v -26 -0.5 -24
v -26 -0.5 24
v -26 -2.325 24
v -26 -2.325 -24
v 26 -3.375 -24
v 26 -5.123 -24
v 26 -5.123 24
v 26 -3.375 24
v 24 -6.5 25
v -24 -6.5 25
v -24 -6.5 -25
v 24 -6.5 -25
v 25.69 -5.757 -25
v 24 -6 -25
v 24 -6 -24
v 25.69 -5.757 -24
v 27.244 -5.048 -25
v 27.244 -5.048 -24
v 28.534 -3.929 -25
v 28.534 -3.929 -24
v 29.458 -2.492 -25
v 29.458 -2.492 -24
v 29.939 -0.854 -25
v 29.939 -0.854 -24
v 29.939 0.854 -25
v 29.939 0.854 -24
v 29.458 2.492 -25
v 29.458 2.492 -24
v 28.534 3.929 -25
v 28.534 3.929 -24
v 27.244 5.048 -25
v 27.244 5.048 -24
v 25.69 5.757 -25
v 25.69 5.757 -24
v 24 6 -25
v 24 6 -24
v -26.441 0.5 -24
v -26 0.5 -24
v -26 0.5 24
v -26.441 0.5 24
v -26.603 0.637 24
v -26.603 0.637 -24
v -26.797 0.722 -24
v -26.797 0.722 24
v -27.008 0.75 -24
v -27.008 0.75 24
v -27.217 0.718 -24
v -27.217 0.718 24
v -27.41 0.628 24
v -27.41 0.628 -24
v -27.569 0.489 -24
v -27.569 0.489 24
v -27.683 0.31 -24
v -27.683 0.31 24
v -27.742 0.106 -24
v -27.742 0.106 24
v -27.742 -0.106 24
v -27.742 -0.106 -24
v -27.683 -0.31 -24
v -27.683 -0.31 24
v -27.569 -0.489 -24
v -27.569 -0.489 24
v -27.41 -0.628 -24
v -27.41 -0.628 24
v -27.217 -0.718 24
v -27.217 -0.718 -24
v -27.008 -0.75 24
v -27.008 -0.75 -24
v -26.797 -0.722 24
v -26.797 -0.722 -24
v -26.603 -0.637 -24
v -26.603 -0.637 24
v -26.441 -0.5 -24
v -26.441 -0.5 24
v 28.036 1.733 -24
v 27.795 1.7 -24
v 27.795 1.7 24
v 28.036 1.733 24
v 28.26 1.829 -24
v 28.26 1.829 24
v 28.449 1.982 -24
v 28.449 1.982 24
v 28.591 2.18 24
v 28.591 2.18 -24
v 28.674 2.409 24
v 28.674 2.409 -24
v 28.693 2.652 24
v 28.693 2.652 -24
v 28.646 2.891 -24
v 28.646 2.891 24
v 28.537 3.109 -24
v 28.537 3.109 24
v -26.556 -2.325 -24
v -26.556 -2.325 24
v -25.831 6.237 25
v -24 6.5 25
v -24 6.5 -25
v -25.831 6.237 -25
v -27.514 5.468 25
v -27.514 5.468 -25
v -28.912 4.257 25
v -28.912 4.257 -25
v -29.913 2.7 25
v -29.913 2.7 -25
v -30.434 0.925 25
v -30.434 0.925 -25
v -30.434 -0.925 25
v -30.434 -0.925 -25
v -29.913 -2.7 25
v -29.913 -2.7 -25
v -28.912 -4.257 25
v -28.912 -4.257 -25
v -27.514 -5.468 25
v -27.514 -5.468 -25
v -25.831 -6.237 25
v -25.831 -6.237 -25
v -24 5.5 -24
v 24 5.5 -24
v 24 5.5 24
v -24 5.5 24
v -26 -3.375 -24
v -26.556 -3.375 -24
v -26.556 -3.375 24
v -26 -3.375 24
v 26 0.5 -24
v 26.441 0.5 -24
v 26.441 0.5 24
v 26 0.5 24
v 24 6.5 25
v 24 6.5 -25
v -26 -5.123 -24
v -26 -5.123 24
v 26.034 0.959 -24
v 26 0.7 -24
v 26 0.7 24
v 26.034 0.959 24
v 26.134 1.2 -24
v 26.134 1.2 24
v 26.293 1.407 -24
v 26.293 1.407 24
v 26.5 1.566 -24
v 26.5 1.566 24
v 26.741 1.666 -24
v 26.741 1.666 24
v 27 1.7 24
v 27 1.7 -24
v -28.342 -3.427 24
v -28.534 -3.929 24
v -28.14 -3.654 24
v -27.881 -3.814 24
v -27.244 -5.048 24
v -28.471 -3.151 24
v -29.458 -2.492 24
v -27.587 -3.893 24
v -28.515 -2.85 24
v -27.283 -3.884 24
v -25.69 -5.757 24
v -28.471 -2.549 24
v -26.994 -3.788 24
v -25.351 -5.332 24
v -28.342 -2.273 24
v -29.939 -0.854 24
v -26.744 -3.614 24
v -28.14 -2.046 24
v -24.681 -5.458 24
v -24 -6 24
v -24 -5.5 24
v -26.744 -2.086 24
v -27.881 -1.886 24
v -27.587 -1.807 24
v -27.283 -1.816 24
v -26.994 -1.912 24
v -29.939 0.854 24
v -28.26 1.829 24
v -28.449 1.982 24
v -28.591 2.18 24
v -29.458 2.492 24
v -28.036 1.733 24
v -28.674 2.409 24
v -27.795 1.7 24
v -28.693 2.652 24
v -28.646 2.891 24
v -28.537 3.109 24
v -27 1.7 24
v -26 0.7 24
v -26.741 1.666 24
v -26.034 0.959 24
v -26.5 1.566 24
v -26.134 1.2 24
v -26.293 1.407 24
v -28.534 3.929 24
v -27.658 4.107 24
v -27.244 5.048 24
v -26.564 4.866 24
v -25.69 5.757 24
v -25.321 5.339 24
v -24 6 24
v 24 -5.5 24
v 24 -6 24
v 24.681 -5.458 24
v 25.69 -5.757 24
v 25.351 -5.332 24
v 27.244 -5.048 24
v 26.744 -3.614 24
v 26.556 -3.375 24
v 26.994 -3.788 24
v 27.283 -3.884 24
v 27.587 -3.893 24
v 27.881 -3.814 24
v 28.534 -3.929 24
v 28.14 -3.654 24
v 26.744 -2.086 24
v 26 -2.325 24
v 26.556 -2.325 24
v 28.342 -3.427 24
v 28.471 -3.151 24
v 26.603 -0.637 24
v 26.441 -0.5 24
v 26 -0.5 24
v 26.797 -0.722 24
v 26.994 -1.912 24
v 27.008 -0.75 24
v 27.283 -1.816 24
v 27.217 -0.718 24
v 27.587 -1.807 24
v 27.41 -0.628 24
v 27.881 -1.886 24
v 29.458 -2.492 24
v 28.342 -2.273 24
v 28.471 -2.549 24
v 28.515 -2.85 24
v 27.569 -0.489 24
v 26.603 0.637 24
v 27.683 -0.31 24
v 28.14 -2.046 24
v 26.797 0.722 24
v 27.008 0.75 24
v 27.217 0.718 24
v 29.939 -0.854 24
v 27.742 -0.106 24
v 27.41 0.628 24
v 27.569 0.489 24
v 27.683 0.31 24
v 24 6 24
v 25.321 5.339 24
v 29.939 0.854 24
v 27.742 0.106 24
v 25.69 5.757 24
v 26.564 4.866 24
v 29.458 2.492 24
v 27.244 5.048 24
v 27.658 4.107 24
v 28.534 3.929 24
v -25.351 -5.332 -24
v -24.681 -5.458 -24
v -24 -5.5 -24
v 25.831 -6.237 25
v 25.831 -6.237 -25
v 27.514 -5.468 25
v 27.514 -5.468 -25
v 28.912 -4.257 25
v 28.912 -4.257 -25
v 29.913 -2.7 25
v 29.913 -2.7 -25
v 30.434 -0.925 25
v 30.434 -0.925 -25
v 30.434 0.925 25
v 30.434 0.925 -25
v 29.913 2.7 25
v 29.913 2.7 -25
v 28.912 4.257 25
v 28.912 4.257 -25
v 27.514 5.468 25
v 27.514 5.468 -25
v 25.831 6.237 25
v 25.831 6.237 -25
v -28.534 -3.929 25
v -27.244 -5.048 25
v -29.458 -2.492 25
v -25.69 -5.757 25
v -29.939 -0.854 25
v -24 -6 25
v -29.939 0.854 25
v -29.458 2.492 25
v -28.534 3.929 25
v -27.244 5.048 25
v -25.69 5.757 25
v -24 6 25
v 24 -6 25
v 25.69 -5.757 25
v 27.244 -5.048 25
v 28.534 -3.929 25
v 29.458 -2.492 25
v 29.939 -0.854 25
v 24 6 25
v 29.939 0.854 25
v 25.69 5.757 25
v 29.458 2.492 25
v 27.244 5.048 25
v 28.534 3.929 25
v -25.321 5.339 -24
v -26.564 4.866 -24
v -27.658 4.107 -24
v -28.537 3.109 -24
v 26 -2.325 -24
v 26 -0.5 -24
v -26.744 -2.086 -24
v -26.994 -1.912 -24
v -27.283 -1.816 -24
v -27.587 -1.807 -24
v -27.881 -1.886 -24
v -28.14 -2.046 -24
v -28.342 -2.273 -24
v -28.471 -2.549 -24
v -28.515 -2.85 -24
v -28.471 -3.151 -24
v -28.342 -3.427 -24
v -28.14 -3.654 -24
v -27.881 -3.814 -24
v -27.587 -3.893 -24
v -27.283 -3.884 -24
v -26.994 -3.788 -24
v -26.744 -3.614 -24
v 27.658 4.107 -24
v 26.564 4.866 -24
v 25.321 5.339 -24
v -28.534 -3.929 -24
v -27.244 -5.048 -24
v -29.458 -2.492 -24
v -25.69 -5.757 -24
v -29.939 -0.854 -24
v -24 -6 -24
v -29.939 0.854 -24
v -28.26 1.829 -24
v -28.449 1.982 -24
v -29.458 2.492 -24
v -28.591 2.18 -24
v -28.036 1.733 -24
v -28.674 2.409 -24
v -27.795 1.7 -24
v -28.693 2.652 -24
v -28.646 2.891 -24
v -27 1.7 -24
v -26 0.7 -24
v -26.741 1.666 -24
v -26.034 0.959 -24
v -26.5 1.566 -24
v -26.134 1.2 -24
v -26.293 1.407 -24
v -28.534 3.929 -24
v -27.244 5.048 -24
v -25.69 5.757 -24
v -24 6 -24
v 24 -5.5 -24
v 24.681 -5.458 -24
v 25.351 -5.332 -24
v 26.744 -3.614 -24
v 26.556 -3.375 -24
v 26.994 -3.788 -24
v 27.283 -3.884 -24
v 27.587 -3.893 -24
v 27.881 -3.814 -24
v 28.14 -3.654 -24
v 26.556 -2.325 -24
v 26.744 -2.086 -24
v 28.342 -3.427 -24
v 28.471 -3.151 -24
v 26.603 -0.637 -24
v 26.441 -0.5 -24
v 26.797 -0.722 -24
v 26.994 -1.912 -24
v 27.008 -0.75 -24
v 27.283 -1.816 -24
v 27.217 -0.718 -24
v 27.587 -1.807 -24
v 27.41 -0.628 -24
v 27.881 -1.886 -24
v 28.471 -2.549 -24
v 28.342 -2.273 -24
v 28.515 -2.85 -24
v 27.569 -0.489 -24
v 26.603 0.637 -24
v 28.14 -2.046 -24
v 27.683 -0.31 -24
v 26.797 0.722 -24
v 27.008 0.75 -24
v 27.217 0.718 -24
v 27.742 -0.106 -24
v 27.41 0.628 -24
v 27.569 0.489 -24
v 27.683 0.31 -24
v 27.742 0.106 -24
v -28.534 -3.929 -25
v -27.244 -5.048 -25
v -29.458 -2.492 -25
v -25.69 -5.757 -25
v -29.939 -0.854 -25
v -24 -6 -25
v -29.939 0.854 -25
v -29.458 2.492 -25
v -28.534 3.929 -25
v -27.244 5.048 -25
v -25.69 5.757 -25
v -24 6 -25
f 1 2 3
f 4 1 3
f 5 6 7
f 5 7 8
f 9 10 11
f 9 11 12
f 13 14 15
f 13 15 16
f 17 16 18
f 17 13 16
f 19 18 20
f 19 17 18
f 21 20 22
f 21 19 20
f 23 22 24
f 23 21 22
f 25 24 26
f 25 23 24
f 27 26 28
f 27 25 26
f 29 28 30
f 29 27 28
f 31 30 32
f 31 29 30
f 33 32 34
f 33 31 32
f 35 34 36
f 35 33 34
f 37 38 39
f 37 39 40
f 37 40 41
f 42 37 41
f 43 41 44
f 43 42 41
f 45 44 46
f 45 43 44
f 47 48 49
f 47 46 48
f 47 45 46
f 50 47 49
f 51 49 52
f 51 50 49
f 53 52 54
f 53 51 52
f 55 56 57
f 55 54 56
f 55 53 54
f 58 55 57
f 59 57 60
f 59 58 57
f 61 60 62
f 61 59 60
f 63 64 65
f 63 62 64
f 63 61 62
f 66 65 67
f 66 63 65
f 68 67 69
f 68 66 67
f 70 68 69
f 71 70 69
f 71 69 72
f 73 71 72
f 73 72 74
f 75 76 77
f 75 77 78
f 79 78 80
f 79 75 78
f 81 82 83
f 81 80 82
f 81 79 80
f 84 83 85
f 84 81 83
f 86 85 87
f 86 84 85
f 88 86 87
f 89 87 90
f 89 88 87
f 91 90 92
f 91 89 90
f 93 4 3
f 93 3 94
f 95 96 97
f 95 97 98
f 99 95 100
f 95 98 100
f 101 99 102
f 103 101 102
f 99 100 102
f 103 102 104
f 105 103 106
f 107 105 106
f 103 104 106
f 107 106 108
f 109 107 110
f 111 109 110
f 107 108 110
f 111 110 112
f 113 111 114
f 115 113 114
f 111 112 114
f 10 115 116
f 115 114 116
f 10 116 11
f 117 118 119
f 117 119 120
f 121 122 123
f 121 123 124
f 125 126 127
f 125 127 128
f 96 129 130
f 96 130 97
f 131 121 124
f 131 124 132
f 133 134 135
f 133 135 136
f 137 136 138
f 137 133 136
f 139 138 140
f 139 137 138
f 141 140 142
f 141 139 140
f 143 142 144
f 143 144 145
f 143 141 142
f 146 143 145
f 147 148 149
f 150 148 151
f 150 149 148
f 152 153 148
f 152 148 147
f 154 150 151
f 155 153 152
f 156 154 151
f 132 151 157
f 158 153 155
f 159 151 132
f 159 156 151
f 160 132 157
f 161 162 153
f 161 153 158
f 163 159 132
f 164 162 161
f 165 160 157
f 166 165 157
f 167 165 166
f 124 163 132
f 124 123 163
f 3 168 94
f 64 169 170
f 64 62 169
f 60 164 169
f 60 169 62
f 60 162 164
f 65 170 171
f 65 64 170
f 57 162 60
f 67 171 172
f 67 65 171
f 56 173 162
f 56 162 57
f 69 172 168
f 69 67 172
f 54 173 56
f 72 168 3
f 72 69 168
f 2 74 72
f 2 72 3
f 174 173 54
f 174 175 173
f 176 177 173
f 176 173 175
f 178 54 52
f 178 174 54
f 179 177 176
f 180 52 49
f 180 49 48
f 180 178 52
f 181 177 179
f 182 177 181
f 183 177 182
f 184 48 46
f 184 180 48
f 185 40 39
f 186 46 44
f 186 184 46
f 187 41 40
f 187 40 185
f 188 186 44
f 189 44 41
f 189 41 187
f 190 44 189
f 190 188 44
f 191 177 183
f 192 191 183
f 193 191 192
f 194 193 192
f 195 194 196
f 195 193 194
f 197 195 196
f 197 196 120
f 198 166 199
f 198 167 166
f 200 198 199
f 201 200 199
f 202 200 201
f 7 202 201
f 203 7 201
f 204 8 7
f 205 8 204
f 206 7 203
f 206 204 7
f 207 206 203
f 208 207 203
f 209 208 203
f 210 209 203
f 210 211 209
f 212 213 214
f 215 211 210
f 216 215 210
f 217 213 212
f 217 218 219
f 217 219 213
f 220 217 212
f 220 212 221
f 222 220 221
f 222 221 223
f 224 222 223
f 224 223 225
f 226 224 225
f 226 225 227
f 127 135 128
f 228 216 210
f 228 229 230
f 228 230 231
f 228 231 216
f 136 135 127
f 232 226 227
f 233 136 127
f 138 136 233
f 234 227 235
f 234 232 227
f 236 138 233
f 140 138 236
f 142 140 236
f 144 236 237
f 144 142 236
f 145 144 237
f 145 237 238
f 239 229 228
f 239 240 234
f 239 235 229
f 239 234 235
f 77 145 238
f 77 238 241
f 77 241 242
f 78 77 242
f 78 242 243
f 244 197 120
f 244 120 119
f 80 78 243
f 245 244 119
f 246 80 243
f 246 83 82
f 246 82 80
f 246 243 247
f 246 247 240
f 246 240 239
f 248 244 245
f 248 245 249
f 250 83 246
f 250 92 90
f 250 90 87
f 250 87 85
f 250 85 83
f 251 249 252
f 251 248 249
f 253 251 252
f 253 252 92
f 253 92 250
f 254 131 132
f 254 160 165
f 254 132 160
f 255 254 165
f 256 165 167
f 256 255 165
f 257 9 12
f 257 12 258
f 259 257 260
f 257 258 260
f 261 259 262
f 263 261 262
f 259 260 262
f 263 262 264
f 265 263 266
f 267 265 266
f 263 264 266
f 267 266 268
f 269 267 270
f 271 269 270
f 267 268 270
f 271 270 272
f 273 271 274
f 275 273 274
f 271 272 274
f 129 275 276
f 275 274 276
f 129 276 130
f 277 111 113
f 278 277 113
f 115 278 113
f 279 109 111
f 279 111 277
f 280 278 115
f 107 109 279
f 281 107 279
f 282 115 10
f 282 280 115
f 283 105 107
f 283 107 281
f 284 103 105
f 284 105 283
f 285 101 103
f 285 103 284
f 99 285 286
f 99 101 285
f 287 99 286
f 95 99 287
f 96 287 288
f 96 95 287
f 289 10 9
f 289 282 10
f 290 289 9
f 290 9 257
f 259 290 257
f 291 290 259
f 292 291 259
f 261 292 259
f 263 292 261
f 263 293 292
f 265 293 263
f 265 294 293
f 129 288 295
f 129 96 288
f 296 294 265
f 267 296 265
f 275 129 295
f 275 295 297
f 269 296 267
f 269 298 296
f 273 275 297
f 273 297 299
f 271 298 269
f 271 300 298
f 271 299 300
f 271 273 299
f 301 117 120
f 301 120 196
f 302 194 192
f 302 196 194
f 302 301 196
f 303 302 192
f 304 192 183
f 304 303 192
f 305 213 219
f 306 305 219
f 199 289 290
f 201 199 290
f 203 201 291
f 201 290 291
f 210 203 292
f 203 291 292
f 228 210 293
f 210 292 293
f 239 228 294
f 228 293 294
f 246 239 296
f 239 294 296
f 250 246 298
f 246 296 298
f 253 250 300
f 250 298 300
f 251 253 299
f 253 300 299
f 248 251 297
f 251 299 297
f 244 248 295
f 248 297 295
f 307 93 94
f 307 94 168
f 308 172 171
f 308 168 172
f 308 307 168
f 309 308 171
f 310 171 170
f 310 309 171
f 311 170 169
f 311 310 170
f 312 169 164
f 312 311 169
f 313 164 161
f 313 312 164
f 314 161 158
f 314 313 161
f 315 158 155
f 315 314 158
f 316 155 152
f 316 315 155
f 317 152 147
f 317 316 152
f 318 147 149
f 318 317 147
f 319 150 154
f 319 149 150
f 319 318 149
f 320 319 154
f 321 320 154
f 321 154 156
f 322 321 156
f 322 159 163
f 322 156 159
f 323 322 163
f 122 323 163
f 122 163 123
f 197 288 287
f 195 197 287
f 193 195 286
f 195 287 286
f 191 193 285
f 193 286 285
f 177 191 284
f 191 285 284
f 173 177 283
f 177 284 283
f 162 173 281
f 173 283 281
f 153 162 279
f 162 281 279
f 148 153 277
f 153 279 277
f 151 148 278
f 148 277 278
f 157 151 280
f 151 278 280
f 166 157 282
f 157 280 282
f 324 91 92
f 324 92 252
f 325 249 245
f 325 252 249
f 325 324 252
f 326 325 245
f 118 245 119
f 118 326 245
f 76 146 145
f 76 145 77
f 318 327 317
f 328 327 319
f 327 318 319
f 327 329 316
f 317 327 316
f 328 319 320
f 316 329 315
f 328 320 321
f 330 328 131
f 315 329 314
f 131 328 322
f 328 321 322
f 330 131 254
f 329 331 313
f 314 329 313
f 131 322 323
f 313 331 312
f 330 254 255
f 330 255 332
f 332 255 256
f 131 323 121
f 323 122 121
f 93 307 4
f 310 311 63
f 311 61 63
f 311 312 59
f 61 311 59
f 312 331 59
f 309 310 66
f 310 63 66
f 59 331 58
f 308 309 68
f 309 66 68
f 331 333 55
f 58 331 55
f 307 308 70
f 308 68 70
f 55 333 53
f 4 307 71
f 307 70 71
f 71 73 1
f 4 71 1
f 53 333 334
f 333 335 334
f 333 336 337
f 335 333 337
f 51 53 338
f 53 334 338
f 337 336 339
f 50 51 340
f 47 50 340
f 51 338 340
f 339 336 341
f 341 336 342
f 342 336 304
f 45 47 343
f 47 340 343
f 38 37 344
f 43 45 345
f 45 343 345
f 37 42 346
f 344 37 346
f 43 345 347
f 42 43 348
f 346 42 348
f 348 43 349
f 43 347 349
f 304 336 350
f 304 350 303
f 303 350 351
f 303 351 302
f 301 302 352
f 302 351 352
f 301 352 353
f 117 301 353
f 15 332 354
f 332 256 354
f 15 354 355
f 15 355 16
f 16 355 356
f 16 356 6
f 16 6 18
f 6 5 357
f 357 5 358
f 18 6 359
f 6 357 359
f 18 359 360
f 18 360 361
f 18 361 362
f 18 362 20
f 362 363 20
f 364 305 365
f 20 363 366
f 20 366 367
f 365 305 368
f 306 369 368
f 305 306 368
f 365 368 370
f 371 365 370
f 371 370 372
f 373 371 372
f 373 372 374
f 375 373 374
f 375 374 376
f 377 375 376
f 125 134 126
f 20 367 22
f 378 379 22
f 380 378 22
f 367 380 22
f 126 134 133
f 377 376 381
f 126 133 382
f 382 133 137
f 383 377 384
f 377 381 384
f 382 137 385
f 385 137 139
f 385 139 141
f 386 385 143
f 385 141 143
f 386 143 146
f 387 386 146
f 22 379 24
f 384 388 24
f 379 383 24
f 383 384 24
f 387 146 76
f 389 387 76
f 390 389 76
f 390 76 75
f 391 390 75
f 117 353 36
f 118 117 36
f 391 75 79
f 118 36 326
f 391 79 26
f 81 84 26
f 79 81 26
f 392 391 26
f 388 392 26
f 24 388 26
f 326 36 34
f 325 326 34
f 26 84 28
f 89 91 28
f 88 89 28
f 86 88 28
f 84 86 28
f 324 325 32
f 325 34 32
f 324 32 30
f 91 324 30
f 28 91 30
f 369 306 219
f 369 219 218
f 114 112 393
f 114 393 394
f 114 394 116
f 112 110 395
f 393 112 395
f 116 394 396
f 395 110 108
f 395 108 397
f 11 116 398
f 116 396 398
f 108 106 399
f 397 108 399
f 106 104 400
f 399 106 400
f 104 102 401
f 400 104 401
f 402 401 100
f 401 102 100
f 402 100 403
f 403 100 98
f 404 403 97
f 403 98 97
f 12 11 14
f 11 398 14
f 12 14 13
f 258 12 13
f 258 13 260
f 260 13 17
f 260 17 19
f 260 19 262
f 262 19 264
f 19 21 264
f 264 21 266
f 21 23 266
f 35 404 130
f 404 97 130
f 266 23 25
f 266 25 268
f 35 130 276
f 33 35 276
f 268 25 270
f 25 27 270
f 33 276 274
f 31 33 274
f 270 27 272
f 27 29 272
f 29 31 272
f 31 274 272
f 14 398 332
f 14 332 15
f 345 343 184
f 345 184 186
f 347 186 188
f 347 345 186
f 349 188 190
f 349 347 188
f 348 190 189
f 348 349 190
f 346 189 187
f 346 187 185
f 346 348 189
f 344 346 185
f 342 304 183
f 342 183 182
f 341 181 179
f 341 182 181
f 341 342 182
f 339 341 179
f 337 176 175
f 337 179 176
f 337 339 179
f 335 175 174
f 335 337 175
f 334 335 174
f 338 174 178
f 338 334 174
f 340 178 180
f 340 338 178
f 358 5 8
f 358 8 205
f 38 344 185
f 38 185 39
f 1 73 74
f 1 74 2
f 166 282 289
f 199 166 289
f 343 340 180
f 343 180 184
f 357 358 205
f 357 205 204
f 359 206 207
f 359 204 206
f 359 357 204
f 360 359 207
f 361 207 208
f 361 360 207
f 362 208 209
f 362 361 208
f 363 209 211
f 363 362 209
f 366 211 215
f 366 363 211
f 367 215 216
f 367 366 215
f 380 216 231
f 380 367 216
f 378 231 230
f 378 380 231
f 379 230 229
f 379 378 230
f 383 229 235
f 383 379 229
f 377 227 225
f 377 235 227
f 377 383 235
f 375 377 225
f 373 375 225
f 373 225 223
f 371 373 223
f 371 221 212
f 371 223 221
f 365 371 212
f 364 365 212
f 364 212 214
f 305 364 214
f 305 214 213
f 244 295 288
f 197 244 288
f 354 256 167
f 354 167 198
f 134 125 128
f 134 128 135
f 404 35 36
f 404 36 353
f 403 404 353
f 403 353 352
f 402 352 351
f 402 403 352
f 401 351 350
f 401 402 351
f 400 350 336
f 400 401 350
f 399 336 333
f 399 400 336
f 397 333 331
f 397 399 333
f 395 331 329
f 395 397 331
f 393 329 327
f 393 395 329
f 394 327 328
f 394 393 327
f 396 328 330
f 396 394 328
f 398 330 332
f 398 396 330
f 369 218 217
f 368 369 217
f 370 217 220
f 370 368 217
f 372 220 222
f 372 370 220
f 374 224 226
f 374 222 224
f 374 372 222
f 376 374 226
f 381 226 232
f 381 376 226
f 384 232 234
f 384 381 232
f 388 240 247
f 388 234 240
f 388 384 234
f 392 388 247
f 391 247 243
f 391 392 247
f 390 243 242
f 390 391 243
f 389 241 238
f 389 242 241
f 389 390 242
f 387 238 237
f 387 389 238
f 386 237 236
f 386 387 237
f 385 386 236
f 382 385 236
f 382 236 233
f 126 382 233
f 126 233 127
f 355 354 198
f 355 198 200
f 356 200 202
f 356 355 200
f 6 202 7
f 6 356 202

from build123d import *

# Parameters (mm, degrees)
BOSS_EXTRUDE1_DEPTH      = 25
BOSS_EXTRUDE1_DEPTH_BACK = 25
CUT_EXTRUDE1_DEPTH       = 1


with BuildPart() as part:
    # Sketch1 → Boss-Extrude1 (new, two sides: drawn at the far end of the back side and taken through both)
    with BuildSketch(Plane.XY.offset(-BOSS_EXTRUDE1_DEPTH_BACK)):
        with BuildLine():
            Line((24, 6.5), (-24, 6.5))
            ThreePointArc((-24, 6.5), (-30.5, 0), (-24, -6.5))
            Line((-24, -6.5), (24, -6.5))
            ThreePointArc((24, -6.5), (30.5, 0), (24, 6.5))
        make_face()
        with BuildLine():
            Line((24, 5.5), (-24, 5.5))
            ThreePointArc((-24, 5.5), (-26.564388223, 4.865584553), (-28.537180991, 3.108695652))
            ThreePointArc((-28.537180991, 3.108695652), (-28.590919755, 2.180372836), (-27.794733192, 1.7))
            Line((-27.794733192, 1.7), (-27, 1.7))
            ThreePointArc((-27, 1.7), (-26.292893219, 1.407106781), (-26, 0.7))
            Line((-26, 0.7), (-26, 0.5))
            Line((-26, 0.5), (-26.440983006, 0.5))
            ThreePointArc((-26.440983006, 0.5), (-27.75, 0), (-26.440983006, -0.5))
            Line((-26.440983006, -0.5), (-26, -0.5))
            Line((-26, -0.5), (-26, -2.325))
            Line((-26, -2.325), (-26.555673326, -2.325))
            ThreePointArc((-26.555673326, -2.325), (-28.515, -2.85), (-26.555673326, -3.375))
            Line((-26.555673326, -3.375), (-26, -3.375))
            Line((-26, -3.375), (-26, -5.123475383))
            ThreePointArc((-26, -5.123475383), (-25.017567048, -5.405049242), (-24, -5.5))
            Line((-24, -5.5), (24, -5.5))
            ThreePointArc((24, -5.5), (25.017567048, -5.405049242), (26, -5.123475383))
            Line((26, -5.123475383), (26, -3.375))
            Line((26, -3.375), (26.555673326, -3.375))
            ThreePointArc((26.555673326, -3.375), (28.515, -2.85), (26.555673326, -2.325))
            Line((26.555673326, -2.325), (26, -2.325))
            Line((26, -2.325), (26, -0.5))
            Line((26, -0.5), (26.440983006, -0.5))
            ThreePointArc((26.440983006, -0.5), (27.75, 0), (26.440983006, 0.5))
            Line((26.440983006, 0.5), (26, 0.5))
            Line((26, 0.5), (26, 0.7))
            ThreePointArc((26, 0.7), (26.292893219, 1.407106781), (27, 1.7))
            Line((27, 1.7), (27.794733192, 1.7))
            ThreePointArc((27.794733192, 1.7), (28.590919755, 2.180372836), (28.537180991, 3.108695652))
            ThreePointArc((28.537180991, 3.108695652), (26.564388223, 4.865584553), (24, 5.5))
        make_face(mode=Mode.SUBTRACT)
    extrude(amount=BOSS_EXTRUDE1_DEPTH + BOSS_EXTRUDE1_DEPTH_BACK)

    # Sketch2 → Cut-Extrude1 (cut)
    with BuildSketch(Plane.XY.offset(25)):
        with BuildLine():
            Line((24, 6), (-24, 6))
            ThreePointArc((-24, 6), (-30, 0), (-24, -6))
            Line((-24, -6), (24, -6))
            ThreePointArc((24, -6), (30, 0), (24, 6))
        make_face()
    cut_extrude1 = extrude(amount=-CUT_EXTRUDE1_DEPTH, mode=Mode.SUBTRACT)

    # Mirror1: Cut-Extrude1 across plane
    add(cut_extrude1.mirror(Plane.XY), mode=Mode.SUBTRACT)


solid = part.part
